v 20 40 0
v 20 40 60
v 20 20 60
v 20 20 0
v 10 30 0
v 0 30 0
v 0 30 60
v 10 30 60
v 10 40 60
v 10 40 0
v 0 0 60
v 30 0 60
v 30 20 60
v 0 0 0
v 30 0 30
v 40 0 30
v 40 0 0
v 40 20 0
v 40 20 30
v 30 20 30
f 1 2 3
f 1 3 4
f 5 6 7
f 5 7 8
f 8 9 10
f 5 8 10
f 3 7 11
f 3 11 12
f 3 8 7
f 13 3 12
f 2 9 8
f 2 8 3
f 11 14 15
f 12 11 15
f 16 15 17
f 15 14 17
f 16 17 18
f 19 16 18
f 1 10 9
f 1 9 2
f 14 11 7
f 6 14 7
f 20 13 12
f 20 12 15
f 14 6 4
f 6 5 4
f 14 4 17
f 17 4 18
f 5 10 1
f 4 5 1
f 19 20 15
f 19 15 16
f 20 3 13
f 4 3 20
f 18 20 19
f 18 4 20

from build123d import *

# Parameters (mm, degrees)
SKETCH1_W           = 40
SKETCH1_H           = 40
BOSS_EXTRUDE1_DEPTH = 60
SKETCH2_W           = 20
SKETCH2_H           = 60
CUT_EXTRUDE1_DEPTH  = 20
SKETCH3_W           = 10
SKETCH3_H           = 30
CUT_EXTRUDE2_DEPTH  = 20
SKETCH4_W           = 10
SKETCH4_H           = 60
CUT_EXTRUDE3_DEPTH  = 10


with BuildPart() as part:
    # Sketch1 → Boss-Extrude1 (new body)
    with BuildSketch(Plane.XY):
        with Locations((20, 20)):
            Rectangle(SKETCH1_W, SKETCH1_H)
    extrude(amount=BOSS_EXTRUDE1_DEPTH)

    # Sketch2 → Cut-Extrude1 (cut)
    with BuildSketch(Plane(origin=(0, 40, 0), x_dir=(1, 0, 0), z_dir=(0, 1, 0))):
        with Locations((30, -30)):
            Rectangle(SKETCH2_W, SKETCH2_H)
    extrude(amount=-CUT_EXTRUDE1_DEPTH, mode=Mode.SUBTRACT)

    # Sketch3 → Cut-Extrude2 (cut)
    with BuildSketch(Plane(origin=(0, 20, 0), x_dir=(1, 0, 0), z_dir=(0, 1, 0))):
        with Locations((35, -45)):
            Rectangle(SKETCH3_W, SKETCH3_H)
    extrude(amount=-CUT_EXTRUDE2_DEPTH, mode=Mode.SUBTRACT)

    # Sketch4 → Cut-Extrude3 (cut)
    with BuildSketch(Plane(origin=(0, 40, 0), x_dir=(1, 0, 0), z_dir=(0, 1, 0))):
        with Locations((5, -30)):
            Rectangle(SKETCH4_W, SKETCH4_H)
    extrude(amount=-CUT_EXTRUDE3_DEPTH, mode=Mode.SUBTRACT)


solid = part.part
